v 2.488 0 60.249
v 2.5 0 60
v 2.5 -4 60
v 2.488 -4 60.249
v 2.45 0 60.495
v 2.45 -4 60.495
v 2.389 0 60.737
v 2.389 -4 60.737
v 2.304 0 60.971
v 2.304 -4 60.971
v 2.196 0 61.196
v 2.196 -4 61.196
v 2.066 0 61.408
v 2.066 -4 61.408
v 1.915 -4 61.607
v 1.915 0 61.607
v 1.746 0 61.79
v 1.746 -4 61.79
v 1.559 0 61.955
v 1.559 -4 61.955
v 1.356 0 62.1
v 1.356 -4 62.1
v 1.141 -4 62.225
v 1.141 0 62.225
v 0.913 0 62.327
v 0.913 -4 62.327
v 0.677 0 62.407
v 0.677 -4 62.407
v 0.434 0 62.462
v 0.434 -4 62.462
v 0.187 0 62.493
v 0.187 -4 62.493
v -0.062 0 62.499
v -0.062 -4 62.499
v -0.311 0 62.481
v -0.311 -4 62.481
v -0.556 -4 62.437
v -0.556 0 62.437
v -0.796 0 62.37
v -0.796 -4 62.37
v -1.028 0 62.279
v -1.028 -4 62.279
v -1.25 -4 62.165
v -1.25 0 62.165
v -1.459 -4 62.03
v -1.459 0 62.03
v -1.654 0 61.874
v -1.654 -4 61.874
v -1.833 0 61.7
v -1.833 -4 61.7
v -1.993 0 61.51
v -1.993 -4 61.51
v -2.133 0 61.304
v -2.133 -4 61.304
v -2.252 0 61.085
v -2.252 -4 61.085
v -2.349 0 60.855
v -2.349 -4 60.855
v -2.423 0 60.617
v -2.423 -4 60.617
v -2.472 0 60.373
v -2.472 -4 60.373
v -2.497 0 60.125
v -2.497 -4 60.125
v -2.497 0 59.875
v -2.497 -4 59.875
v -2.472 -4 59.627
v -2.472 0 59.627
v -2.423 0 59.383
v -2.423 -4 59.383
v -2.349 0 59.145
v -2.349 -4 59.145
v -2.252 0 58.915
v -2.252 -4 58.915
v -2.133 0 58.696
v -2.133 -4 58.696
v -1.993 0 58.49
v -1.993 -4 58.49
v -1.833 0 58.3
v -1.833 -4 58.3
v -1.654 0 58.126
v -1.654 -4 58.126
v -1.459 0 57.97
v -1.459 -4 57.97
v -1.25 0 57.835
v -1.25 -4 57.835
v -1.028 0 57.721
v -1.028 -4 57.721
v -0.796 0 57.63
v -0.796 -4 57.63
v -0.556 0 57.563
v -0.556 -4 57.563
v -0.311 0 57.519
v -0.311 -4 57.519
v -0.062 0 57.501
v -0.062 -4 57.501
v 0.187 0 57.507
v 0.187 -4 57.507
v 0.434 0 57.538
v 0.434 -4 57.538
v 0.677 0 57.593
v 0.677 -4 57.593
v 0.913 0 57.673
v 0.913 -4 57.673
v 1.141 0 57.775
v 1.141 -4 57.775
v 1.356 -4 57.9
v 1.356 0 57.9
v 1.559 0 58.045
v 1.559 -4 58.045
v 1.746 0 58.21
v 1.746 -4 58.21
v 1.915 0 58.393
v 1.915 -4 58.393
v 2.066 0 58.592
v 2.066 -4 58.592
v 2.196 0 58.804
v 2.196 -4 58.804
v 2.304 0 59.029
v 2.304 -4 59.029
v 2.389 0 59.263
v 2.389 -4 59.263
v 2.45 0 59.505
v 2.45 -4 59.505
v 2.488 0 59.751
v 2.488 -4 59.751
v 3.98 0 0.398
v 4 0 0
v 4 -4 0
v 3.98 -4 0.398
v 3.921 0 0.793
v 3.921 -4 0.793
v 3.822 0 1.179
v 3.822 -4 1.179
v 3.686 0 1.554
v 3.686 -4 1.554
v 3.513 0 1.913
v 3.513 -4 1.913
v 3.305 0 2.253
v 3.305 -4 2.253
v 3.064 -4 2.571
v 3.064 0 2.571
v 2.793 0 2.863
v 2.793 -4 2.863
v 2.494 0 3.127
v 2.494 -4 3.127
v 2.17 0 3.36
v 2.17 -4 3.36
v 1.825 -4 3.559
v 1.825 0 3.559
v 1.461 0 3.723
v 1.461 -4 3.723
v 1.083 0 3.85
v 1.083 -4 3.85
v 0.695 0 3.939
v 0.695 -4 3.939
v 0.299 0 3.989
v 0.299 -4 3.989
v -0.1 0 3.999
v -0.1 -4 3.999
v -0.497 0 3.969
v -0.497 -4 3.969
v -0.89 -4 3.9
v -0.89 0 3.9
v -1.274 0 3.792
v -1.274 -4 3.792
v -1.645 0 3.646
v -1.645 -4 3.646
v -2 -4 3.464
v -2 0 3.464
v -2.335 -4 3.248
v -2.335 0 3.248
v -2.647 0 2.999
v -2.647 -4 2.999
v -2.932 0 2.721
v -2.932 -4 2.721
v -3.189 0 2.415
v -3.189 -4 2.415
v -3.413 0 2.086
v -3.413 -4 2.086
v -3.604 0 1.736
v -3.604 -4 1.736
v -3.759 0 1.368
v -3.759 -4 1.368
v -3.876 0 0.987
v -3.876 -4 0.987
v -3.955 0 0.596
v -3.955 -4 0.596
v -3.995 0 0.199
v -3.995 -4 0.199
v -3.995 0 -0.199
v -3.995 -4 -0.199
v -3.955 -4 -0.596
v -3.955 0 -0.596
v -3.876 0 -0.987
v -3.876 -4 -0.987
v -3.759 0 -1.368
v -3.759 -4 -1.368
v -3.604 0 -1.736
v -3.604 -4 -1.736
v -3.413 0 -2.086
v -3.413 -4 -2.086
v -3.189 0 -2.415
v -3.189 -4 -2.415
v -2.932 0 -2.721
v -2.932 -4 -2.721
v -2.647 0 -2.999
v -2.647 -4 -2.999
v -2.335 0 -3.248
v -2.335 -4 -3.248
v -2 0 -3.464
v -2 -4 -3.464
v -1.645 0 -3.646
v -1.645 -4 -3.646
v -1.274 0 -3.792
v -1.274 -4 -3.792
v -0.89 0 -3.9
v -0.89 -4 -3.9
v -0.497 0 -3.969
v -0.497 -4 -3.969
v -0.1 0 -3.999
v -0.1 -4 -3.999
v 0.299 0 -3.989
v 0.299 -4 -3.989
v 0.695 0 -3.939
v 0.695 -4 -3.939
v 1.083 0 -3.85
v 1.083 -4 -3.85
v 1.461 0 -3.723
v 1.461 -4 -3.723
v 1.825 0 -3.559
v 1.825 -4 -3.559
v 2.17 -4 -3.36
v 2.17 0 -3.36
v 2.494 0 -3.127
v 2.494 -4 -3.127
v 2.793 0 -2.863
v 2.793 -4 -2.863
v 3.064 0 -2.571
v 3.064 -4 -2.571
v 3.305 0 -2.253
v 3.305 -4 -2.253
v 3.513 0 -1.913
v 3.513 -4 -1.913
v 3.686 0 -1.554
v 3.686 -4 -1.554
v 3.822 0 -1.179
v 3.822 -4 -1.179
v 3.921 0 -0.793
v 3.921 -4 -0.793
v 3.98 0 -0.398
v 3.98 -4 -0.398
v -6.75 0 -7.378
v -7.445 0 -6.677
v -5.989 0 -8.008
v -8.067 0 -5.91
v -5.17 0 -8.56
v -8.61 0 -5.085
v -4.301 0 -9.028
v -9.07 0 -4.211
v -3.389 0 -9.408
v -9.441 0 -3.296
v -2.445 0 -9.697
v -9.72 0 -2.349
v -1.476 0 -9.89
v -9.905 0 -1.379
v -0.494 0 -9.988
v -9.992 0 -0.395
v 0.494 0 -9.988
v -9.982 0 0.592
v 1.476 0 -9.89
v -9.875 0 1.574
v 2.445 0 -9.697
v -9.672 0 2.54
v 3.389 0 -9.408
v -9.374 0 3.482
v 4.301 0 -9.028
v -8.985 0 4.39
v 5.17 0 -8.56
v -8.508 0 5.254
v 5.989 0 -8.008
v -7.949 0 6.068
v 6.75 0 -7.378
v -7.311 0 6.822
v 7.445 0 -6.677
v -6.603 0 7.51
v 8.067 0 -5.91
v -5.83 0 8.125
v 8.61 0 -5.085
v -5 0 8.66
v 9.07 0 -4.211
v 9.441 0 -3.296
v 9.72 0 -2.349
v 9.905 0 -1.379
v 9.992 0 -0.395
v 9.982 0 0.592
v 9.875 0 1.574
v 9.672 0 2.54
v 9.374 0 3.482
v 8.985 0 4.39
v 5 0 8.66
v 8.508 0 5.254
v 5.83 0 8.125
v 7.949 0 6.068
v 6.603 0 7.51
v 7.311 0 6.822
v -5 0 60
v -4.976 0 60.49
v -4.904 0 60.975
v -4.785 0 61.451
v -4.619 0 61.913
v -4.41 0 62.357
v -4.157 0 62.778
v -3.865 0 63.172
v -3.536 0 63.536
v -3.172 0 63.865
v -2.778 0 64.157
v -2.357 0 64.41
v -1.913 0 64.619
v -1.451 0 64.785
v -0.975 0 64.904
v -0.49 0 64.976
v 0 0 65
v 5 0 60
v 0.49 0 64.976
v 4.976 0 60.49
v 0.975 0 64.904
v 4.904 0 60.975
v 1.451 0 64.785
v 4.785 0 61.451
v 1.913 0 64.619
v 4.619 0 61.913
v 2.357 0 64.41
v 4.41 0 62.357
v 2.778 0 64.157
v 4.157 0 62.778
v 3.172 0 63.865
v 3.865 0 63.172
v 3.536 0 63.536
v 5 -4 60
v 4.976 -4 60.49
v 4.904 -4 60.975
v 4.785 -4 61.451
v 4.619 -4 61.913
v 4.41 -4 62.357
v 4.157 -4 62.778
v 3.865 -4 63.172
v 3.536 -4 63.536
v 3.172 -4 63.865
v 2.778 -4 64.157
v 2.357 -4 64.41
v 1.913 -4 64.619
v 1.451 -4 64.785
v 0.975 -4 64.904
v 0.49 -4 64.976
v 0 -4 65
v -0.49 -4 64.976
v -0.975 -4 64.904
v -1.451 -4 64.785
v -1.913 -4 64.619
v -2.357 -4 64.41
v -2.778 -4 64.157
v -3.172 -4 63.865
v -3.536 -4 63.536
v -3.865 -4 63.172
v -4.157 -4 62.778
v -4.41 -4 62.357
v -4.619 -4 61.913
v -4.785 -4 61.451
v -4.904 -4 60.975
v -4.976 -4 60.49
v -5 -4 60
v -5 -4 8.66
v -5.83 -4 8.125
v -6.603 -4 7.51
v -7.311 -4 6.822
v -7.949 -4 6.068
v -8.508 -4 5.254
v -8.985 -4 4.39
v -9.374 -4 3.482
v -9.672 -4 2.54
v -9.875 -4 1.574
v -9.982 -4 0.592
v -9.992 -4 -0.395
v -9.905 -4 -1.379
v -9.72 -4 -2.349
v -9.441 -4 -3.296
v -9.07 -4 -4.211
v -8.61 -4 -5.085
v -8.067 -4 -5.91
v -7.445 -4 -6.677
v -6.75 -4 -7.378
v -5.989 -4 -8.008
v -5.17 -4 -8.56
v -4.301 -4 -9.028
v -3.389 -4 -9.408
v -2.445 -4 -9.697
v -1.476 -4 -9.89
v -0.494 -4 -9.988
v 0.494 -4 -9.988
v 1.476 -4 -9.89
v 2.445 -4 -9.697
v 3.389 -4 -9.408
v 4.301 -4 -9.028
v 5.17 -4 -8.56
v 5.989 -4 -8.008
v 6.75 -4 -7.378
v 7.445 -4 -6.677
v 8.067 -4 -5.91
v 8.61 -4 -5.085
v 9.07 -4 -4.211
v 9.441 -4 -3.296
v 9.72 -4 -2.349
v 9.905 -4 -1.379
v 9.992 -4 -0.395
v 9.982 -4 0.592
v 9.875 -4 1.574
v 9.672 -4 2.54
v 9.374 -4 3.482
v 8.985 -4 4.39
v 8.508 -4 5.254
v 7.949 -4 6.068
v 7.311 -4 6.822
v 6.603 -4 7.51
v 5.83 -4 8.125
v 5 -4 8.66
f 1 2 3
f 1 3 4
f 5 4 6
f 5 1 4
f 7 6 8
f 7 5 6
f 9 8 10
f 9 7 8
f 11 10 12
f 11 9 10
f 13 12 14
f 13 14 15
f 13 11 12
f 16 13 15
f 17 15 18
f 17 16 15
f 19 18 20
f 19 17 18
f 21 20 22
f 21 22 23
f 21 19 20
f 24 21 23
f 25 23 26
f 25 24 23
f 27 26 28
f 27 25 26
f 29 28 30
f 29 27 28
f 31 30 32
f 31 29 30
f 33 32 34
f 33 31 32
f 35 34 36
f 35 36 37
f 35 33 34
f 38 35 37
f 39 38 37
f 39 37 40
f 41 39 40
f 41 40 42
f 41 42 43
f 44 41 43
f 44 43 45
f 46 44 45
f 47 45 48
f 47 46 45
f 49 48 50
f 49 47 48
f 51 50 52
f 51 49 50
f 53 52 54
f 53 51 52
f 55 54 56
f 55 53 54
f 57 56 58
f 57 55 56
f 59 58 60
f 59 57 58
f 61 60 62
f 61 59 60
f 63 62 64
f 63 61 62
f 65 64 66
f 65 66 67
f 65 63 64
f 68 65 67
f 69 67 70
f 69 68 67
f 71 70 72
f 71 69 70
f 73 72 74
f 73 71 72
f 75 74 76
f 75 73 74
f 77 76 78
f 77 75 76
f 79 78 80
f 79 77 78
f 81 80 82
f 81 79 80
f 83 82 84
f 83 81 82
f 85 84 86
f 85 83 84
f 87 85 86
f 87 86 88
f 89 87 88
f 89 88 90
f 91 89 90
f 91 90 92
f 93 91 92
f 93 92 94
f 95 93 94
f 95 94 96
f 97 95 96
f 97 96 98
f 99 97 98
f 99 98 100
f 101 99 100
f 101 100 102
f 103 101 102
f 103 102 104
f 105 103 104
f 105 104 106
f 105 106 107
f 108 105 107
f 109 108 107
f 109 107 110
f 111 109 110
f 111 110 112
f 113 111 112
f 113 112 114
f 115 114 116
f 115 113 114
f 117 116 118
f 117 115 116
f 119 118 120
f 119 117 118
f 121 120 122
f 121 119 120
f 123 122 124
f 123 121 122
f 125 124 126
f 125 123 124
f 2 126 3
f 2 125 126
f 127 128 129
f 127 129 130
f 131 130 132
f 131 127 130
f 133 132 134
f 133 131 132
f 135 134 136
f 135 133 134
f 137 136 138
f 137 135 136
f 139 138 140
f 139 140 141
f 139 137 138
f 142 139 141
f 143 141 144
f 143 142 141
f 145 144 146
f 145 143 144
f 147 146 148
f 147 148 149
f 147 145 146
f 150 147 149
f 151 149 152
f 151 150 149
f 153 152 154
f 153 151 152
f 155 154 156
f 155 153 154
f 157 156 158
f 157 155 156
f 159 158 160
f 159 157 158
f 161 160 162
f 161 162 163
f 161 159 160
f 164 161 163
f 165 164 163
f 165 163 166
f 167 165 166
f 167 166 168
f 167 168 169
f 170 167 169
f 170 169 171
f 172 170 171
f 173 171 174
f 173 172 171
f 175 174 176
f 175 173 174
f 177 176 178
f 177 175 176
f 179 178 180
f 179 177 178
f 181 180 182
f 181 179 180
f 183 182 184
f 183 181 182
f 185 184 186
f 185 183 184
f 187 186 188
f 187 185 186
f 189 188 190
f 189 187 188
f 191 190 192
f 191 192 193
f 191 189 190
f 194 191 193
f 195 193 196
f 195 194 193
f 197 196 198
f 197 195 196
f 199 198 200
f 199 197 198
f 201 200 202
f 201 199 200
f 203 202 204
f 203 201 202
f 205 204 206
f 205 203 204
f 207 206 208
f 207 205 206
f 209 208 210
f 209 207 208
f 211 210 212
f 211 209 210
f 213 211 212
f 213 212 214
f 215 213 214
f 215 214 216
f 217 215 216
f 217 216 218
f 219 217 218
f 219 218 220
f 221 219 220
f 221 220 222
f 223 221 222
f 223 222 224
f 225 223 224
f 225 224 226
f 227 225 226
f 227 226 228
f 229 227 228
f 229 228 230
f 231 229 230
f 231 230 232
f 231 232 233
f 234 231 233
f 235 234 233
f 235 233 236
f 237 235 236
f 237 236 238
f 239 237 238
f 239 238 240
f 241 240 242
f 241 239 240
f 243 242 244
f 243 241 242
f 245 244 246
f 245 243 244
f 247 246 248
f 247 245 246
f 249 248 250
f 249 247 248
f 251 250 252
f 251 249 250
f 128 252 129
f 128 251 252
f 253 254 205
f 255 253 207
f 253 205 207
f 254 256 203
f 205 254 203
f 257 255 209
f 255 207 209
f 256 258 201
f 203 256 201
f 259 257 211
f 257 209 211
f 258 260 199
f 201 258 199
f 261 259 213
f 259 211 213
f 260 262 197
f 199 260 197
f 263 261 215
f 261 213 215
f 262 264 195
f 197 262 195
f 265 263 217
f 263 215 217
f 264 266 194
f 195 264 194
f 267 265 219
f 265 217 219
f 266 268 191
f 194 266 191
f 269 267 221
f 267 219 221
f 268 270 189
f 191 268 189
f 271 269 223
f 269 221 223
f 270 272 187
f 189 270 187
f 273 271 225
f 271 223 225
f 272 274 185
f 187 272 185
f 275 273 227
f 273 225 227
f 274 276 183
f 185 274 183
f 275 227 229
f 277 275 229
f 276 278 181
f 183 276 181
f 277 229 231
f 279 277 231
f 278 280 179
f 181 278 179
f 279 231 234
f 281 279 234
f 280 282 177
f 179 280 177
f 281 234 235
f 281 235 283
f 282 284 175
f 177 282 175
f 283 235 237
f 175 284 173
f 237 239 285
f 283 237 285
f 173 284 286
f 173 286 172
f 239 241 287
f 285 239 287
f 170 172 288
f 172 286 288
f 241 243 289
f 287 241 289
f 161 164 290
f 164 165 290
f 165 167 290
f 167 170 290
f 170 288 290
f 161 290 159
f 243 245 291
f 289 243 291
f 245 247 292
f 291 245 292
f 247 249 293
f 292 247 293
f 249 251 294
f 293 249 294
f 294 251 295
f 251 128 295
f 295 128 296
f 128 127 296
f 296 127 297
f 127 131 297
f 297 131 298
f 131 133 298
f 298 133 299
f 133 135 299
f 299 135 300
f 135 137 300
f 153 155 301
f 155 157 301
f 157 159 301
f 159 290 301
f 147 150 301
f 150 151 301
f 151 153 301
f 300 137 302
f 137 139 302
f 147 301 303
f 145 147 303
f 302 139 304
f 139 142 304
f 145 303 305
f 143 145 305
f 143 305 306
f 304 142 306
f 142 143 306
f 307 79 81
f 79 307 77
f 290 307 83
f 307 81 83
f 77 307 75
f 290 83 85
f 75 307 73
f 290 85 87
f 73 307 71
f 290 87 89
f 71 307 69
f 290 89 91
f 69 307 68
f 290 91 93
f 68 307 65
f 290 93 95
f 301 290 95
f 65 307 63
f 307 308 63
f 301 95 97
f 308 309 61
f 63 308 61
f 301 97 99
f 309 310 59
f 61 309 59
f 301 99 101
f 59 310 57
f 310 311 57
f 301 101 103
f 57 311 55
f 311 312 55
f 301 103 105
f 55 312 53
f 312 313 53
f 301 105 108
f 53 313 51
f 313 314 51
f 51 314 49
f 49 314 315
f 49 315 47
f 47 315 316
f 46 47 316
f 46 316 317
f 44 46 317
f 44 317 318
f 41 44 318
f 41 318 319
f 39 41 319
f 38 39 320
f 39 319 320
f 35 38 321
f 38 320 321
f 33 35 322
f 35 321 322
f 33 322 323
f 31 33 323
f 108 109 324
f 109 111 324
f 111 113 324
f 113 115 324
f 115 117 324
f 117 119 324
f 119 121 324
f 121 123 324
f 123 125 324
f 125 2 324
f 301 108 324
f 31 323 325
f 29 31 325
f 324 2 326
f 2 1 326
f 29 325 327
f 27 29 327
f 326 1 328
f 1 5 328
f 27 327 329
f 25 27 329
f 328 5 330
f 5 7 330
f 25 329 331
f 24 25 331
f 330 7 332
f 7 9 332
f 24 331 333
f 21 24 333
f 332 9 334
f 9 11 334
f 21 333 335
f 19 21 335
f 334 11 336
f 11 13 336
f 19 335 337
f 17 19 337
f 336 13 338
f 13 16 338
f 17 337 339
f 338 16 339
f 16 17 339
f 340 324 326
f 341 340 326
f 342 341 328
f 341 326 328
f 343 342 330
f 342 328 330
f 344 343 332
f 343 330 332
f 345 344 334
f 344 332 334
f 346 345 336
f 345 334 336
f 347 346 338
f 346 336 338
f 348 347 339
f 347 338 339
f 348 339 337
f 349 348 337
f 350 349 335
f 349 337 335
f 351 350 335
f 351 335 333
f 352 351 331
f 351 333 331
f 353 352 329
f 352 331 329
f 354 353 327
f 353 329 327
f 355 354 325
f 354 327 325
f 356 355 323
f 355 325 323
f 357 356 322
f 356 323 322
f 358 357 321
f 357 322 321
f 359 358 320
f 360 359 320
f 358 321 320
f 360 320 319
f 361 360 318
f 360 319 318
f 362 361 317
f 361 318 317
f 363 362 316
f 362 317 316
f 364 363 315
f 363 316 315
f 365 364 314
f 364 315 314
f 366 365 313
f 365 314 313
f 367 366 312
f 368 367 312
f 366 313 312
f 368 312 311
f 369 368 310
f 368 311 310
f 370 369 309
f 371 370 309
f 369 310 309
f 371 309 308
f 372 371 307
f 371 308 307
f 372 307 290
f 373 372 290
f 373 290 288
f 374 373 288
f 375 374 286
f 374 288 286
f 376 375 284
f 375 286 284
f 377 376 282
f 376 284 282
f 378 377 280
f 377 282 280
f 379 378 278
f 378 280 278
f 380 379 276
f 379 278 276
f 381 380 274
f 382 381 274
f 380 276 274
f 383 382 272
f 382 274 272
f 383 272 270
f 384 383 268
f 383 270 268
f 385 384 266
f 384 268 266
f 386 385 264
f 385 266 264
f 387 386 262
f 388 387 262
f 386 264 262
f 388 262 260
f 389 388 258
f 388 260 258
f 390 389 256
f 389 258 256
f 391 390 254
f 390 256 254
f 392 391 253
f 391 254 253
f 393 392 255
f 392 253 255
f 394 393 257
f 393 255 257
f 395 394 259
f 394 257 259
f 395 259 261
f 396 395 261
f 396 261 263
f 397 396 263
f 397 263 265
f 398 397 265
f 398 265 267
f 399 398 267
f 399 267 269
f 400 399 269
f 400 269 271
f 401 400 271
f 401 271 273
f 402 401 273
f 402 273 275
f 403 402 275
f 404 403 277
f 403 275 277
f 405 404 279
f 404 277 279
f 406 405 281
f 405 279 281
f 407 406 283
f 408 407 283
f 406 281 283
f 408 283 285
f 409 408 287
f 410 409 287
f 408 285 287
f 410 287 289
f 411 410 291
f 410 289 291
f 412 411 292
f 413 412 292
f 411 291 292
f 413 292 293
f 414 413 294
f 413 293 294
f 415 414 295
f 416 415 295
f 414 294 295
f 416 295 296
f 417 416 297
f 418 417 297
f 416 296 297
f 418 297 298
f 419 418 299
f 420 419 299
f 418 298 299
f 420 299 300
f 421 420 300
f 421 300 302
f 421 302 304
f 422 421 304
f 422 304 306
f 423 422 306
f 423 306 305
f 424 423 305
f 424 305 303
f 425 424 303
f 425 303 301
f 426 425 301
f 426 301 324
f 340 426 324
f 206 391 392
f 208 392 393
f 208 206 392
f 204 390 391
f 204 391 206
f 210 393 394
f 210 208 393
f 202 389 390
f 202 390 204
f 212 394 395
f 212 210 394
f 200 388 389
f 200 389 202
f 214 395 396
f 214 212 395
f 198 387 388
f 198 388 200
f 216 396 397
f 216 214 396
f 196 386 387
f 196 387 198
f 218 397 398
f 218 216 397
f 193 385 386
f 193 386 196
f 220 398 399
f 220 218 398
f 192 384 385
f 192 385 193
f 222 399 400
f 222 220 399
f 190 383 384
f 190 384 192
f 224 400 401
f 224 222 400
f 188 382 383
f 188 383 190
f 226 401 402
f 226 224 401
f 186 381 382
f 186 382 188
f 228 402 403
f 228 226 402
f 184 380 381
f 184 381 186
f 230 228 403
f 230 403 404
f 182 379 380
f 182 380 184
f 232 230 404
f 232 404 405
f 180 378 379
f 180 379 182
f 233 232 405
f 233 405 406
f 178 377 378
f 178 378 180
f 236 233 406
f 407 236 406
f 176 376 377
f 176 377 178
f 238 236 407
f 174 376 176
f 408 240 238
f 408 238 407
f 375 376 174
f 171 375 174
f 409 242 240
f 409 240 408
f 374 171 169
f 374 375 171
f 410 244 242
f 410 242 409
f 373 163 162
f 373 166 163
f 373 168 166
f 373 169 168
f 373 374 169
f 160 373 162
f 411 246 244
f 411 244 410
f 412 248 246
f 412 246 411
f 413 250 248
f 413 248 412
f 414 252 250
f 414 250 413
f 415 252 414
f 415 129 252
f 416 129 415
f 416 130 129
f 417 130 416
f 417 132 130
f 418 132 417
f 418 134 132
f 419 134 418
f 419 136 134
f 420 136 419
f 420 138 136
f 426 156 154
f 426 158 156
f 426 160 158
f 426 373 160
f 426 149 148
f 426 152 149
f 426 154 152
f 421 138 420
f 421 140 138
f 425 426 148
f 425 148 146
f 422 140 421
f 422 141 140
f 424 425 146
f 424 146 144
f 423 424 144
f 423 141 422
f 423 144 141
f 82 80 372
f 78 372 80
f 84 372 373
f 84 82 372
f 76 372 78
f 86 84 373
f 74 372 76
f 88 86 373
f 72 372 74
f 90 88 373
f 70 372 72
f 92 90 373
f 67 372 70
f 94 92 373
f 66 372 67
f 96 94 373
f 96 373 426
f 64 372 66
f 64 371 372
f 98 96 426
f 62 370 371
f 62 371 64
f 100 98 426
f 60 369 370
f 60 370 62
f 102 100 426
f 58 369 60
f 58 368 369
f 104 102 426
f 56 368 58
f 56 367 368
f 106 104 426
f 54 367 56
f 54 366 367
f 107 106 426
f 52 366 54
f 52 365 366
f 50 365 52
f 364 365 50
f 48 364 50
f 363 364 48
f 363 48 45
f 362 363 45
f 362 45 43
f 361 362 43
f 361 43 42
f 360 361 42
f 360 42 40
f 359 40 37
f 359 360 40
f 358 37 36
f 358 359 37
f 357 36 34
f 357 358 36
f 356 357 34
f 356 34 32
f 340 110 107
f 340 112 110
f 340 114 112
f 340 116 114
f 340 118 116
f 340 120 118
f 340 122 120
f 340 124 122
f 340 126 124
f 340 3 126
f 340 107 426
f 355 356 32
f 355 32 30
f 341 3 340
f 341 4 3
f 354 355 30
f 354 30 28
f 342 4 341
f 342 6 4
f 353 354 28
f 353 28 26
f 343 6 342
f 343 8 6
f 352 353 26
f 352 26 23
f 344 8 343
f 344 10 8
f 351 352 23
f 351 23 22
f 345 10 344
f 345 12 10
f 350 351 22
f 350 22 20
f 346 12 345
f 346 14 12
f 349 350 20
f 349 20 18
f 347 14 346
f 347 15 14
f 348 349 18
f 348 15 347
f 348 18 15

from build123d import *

# Parameters (mm, degrees)
F0_R     = 4
F0_R_2   = 2.5
F1_DEPTH = 4


with BuildPart() as f1:
    # F0 (on Front) → F1 (new body)
    with BuildSketch(Plane.XZ):
        with BuildLine():
            Line((-5, 60), (-5, 8.660254))
            ThreePointArc((-5, 8.660254), (0, -10), (5, 8.660254))
            Line((5, 8.660254), (5, 60))
            ThreePointArc((5, 60), (0, 65), (-5, 60))
        make_face()
        Circle(F0_R, mode=Mode.SUBTRACT)
        with Locations((0, 60)):
            Circle(F0_R_2, mode=Mode.SUBTRACT)
    extrude(amount=F1_DEPTH)


solid = f1.part
